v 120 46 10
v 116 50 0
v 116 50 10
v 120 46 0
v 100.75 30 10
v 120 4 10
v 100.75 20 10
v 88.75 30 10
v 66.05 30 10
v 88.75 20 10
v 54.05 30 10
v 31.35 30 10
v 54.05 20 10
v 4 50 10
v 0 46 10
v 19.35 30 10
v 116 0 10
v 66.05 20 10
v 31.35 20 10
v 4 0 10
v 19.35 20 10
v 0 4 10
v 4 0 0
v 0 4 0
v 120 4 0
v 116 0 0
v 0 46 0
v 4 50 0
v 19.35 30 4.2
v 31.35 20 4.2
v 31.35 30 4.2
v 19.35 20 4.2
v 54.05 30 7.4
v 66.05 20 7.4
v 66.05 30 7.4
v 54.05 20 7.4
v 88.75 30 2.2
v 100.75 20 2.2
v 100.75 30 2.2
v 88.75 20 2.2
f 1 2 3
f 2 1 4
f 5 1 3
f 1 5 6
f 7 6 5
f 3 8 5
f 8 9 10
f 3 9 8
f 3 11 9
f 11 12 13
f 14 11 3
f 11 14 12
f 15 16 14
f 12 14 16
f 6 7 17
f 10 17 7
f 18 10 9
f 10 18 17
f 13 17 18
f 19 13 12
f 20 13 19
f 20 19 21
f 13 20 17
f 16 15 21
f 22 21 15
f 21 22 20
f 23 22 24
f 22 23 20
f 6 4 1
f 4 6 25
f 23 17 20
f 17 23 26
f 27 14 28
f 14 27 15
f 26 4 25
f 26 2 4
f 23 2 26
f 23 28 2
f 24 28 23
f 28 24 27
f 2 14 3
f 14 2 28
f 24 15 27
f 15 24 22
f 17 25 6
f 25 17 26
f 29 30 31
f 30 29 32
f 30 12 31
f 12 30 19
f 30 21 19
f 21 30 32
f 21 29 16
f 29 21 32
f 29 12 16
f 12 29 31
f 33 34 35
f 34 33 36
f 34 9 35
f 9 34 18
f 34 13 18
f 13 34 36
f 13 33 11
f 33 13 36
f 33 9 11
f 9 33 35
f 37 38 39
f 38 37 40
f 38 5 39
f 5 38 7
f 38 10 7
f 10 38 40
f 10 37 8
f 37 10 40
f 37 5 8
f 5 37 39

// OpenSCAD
$fn = 32;

// ----------------------------------------------------------------------
// Windowed plate: 3 voids, 120 x 50 x 10 mm
// ----------------------------------------------------------------------

// --- parameters (mm) ---
plate_l = 120;            // plate length, X
plate_w = 50;             // plate width, Y
plate_t = 10;             // plate thickness, Z
edge_margin = 8;          // wall from the plate edge to any window
windows = 3;              // number of windows in the row
win_l = 12;               // window length
win_w = 10;               // window width
win_pitch = 34.7;         // window pitch along X
depth_1 = 5.8;            // depth of void 1 (full thickness = through)
depth_2 = 2.6;            // depth of void 2 (full thickness = through)
depth_3 = 7.8;            // depth of void 3 (full thickness = through)
corner_c = 4;             // corner chamfer of the plate

profile = [[4, 0], [116, 0], [120, 4], [120, 46], [116, 50], [4, 50], [0, 46], [0, 4]];  // primary outline, 8 points, counter clockwise
void_1 = [[19.35, 20], [31.35, 20], [31.35, 30], [19.35, 30]];  // window 1 of the row, 4 points
void_2 = [[54.05, 20], [66.05, 20], [66.05, 30], [54.05, 30]];  // window 2 of the row, 4 points
void_3 = [[88.75, 20], [100.75, 20], [100.75, 30], [88.75, 30]];  // window 3 of the row, 4 points

// --- the one profile operation ---
difference() {
  linear_extrude(height = plate_t) polygon(points = profile);
  translate([0, 0, plate_t - depth_1])
    linear_extrude(height = depth_1 + 1) polygon(points = void_1);
  translate([0, 0, plate_t - depth_2])
    linear_extrude(height = depth_2 + 1) polygon(points = void_2);
  translate([0, 0, plate_t - depth_3])
    linear_extrude(height = depth_3 + 1) polygon(points = void_3);
}
